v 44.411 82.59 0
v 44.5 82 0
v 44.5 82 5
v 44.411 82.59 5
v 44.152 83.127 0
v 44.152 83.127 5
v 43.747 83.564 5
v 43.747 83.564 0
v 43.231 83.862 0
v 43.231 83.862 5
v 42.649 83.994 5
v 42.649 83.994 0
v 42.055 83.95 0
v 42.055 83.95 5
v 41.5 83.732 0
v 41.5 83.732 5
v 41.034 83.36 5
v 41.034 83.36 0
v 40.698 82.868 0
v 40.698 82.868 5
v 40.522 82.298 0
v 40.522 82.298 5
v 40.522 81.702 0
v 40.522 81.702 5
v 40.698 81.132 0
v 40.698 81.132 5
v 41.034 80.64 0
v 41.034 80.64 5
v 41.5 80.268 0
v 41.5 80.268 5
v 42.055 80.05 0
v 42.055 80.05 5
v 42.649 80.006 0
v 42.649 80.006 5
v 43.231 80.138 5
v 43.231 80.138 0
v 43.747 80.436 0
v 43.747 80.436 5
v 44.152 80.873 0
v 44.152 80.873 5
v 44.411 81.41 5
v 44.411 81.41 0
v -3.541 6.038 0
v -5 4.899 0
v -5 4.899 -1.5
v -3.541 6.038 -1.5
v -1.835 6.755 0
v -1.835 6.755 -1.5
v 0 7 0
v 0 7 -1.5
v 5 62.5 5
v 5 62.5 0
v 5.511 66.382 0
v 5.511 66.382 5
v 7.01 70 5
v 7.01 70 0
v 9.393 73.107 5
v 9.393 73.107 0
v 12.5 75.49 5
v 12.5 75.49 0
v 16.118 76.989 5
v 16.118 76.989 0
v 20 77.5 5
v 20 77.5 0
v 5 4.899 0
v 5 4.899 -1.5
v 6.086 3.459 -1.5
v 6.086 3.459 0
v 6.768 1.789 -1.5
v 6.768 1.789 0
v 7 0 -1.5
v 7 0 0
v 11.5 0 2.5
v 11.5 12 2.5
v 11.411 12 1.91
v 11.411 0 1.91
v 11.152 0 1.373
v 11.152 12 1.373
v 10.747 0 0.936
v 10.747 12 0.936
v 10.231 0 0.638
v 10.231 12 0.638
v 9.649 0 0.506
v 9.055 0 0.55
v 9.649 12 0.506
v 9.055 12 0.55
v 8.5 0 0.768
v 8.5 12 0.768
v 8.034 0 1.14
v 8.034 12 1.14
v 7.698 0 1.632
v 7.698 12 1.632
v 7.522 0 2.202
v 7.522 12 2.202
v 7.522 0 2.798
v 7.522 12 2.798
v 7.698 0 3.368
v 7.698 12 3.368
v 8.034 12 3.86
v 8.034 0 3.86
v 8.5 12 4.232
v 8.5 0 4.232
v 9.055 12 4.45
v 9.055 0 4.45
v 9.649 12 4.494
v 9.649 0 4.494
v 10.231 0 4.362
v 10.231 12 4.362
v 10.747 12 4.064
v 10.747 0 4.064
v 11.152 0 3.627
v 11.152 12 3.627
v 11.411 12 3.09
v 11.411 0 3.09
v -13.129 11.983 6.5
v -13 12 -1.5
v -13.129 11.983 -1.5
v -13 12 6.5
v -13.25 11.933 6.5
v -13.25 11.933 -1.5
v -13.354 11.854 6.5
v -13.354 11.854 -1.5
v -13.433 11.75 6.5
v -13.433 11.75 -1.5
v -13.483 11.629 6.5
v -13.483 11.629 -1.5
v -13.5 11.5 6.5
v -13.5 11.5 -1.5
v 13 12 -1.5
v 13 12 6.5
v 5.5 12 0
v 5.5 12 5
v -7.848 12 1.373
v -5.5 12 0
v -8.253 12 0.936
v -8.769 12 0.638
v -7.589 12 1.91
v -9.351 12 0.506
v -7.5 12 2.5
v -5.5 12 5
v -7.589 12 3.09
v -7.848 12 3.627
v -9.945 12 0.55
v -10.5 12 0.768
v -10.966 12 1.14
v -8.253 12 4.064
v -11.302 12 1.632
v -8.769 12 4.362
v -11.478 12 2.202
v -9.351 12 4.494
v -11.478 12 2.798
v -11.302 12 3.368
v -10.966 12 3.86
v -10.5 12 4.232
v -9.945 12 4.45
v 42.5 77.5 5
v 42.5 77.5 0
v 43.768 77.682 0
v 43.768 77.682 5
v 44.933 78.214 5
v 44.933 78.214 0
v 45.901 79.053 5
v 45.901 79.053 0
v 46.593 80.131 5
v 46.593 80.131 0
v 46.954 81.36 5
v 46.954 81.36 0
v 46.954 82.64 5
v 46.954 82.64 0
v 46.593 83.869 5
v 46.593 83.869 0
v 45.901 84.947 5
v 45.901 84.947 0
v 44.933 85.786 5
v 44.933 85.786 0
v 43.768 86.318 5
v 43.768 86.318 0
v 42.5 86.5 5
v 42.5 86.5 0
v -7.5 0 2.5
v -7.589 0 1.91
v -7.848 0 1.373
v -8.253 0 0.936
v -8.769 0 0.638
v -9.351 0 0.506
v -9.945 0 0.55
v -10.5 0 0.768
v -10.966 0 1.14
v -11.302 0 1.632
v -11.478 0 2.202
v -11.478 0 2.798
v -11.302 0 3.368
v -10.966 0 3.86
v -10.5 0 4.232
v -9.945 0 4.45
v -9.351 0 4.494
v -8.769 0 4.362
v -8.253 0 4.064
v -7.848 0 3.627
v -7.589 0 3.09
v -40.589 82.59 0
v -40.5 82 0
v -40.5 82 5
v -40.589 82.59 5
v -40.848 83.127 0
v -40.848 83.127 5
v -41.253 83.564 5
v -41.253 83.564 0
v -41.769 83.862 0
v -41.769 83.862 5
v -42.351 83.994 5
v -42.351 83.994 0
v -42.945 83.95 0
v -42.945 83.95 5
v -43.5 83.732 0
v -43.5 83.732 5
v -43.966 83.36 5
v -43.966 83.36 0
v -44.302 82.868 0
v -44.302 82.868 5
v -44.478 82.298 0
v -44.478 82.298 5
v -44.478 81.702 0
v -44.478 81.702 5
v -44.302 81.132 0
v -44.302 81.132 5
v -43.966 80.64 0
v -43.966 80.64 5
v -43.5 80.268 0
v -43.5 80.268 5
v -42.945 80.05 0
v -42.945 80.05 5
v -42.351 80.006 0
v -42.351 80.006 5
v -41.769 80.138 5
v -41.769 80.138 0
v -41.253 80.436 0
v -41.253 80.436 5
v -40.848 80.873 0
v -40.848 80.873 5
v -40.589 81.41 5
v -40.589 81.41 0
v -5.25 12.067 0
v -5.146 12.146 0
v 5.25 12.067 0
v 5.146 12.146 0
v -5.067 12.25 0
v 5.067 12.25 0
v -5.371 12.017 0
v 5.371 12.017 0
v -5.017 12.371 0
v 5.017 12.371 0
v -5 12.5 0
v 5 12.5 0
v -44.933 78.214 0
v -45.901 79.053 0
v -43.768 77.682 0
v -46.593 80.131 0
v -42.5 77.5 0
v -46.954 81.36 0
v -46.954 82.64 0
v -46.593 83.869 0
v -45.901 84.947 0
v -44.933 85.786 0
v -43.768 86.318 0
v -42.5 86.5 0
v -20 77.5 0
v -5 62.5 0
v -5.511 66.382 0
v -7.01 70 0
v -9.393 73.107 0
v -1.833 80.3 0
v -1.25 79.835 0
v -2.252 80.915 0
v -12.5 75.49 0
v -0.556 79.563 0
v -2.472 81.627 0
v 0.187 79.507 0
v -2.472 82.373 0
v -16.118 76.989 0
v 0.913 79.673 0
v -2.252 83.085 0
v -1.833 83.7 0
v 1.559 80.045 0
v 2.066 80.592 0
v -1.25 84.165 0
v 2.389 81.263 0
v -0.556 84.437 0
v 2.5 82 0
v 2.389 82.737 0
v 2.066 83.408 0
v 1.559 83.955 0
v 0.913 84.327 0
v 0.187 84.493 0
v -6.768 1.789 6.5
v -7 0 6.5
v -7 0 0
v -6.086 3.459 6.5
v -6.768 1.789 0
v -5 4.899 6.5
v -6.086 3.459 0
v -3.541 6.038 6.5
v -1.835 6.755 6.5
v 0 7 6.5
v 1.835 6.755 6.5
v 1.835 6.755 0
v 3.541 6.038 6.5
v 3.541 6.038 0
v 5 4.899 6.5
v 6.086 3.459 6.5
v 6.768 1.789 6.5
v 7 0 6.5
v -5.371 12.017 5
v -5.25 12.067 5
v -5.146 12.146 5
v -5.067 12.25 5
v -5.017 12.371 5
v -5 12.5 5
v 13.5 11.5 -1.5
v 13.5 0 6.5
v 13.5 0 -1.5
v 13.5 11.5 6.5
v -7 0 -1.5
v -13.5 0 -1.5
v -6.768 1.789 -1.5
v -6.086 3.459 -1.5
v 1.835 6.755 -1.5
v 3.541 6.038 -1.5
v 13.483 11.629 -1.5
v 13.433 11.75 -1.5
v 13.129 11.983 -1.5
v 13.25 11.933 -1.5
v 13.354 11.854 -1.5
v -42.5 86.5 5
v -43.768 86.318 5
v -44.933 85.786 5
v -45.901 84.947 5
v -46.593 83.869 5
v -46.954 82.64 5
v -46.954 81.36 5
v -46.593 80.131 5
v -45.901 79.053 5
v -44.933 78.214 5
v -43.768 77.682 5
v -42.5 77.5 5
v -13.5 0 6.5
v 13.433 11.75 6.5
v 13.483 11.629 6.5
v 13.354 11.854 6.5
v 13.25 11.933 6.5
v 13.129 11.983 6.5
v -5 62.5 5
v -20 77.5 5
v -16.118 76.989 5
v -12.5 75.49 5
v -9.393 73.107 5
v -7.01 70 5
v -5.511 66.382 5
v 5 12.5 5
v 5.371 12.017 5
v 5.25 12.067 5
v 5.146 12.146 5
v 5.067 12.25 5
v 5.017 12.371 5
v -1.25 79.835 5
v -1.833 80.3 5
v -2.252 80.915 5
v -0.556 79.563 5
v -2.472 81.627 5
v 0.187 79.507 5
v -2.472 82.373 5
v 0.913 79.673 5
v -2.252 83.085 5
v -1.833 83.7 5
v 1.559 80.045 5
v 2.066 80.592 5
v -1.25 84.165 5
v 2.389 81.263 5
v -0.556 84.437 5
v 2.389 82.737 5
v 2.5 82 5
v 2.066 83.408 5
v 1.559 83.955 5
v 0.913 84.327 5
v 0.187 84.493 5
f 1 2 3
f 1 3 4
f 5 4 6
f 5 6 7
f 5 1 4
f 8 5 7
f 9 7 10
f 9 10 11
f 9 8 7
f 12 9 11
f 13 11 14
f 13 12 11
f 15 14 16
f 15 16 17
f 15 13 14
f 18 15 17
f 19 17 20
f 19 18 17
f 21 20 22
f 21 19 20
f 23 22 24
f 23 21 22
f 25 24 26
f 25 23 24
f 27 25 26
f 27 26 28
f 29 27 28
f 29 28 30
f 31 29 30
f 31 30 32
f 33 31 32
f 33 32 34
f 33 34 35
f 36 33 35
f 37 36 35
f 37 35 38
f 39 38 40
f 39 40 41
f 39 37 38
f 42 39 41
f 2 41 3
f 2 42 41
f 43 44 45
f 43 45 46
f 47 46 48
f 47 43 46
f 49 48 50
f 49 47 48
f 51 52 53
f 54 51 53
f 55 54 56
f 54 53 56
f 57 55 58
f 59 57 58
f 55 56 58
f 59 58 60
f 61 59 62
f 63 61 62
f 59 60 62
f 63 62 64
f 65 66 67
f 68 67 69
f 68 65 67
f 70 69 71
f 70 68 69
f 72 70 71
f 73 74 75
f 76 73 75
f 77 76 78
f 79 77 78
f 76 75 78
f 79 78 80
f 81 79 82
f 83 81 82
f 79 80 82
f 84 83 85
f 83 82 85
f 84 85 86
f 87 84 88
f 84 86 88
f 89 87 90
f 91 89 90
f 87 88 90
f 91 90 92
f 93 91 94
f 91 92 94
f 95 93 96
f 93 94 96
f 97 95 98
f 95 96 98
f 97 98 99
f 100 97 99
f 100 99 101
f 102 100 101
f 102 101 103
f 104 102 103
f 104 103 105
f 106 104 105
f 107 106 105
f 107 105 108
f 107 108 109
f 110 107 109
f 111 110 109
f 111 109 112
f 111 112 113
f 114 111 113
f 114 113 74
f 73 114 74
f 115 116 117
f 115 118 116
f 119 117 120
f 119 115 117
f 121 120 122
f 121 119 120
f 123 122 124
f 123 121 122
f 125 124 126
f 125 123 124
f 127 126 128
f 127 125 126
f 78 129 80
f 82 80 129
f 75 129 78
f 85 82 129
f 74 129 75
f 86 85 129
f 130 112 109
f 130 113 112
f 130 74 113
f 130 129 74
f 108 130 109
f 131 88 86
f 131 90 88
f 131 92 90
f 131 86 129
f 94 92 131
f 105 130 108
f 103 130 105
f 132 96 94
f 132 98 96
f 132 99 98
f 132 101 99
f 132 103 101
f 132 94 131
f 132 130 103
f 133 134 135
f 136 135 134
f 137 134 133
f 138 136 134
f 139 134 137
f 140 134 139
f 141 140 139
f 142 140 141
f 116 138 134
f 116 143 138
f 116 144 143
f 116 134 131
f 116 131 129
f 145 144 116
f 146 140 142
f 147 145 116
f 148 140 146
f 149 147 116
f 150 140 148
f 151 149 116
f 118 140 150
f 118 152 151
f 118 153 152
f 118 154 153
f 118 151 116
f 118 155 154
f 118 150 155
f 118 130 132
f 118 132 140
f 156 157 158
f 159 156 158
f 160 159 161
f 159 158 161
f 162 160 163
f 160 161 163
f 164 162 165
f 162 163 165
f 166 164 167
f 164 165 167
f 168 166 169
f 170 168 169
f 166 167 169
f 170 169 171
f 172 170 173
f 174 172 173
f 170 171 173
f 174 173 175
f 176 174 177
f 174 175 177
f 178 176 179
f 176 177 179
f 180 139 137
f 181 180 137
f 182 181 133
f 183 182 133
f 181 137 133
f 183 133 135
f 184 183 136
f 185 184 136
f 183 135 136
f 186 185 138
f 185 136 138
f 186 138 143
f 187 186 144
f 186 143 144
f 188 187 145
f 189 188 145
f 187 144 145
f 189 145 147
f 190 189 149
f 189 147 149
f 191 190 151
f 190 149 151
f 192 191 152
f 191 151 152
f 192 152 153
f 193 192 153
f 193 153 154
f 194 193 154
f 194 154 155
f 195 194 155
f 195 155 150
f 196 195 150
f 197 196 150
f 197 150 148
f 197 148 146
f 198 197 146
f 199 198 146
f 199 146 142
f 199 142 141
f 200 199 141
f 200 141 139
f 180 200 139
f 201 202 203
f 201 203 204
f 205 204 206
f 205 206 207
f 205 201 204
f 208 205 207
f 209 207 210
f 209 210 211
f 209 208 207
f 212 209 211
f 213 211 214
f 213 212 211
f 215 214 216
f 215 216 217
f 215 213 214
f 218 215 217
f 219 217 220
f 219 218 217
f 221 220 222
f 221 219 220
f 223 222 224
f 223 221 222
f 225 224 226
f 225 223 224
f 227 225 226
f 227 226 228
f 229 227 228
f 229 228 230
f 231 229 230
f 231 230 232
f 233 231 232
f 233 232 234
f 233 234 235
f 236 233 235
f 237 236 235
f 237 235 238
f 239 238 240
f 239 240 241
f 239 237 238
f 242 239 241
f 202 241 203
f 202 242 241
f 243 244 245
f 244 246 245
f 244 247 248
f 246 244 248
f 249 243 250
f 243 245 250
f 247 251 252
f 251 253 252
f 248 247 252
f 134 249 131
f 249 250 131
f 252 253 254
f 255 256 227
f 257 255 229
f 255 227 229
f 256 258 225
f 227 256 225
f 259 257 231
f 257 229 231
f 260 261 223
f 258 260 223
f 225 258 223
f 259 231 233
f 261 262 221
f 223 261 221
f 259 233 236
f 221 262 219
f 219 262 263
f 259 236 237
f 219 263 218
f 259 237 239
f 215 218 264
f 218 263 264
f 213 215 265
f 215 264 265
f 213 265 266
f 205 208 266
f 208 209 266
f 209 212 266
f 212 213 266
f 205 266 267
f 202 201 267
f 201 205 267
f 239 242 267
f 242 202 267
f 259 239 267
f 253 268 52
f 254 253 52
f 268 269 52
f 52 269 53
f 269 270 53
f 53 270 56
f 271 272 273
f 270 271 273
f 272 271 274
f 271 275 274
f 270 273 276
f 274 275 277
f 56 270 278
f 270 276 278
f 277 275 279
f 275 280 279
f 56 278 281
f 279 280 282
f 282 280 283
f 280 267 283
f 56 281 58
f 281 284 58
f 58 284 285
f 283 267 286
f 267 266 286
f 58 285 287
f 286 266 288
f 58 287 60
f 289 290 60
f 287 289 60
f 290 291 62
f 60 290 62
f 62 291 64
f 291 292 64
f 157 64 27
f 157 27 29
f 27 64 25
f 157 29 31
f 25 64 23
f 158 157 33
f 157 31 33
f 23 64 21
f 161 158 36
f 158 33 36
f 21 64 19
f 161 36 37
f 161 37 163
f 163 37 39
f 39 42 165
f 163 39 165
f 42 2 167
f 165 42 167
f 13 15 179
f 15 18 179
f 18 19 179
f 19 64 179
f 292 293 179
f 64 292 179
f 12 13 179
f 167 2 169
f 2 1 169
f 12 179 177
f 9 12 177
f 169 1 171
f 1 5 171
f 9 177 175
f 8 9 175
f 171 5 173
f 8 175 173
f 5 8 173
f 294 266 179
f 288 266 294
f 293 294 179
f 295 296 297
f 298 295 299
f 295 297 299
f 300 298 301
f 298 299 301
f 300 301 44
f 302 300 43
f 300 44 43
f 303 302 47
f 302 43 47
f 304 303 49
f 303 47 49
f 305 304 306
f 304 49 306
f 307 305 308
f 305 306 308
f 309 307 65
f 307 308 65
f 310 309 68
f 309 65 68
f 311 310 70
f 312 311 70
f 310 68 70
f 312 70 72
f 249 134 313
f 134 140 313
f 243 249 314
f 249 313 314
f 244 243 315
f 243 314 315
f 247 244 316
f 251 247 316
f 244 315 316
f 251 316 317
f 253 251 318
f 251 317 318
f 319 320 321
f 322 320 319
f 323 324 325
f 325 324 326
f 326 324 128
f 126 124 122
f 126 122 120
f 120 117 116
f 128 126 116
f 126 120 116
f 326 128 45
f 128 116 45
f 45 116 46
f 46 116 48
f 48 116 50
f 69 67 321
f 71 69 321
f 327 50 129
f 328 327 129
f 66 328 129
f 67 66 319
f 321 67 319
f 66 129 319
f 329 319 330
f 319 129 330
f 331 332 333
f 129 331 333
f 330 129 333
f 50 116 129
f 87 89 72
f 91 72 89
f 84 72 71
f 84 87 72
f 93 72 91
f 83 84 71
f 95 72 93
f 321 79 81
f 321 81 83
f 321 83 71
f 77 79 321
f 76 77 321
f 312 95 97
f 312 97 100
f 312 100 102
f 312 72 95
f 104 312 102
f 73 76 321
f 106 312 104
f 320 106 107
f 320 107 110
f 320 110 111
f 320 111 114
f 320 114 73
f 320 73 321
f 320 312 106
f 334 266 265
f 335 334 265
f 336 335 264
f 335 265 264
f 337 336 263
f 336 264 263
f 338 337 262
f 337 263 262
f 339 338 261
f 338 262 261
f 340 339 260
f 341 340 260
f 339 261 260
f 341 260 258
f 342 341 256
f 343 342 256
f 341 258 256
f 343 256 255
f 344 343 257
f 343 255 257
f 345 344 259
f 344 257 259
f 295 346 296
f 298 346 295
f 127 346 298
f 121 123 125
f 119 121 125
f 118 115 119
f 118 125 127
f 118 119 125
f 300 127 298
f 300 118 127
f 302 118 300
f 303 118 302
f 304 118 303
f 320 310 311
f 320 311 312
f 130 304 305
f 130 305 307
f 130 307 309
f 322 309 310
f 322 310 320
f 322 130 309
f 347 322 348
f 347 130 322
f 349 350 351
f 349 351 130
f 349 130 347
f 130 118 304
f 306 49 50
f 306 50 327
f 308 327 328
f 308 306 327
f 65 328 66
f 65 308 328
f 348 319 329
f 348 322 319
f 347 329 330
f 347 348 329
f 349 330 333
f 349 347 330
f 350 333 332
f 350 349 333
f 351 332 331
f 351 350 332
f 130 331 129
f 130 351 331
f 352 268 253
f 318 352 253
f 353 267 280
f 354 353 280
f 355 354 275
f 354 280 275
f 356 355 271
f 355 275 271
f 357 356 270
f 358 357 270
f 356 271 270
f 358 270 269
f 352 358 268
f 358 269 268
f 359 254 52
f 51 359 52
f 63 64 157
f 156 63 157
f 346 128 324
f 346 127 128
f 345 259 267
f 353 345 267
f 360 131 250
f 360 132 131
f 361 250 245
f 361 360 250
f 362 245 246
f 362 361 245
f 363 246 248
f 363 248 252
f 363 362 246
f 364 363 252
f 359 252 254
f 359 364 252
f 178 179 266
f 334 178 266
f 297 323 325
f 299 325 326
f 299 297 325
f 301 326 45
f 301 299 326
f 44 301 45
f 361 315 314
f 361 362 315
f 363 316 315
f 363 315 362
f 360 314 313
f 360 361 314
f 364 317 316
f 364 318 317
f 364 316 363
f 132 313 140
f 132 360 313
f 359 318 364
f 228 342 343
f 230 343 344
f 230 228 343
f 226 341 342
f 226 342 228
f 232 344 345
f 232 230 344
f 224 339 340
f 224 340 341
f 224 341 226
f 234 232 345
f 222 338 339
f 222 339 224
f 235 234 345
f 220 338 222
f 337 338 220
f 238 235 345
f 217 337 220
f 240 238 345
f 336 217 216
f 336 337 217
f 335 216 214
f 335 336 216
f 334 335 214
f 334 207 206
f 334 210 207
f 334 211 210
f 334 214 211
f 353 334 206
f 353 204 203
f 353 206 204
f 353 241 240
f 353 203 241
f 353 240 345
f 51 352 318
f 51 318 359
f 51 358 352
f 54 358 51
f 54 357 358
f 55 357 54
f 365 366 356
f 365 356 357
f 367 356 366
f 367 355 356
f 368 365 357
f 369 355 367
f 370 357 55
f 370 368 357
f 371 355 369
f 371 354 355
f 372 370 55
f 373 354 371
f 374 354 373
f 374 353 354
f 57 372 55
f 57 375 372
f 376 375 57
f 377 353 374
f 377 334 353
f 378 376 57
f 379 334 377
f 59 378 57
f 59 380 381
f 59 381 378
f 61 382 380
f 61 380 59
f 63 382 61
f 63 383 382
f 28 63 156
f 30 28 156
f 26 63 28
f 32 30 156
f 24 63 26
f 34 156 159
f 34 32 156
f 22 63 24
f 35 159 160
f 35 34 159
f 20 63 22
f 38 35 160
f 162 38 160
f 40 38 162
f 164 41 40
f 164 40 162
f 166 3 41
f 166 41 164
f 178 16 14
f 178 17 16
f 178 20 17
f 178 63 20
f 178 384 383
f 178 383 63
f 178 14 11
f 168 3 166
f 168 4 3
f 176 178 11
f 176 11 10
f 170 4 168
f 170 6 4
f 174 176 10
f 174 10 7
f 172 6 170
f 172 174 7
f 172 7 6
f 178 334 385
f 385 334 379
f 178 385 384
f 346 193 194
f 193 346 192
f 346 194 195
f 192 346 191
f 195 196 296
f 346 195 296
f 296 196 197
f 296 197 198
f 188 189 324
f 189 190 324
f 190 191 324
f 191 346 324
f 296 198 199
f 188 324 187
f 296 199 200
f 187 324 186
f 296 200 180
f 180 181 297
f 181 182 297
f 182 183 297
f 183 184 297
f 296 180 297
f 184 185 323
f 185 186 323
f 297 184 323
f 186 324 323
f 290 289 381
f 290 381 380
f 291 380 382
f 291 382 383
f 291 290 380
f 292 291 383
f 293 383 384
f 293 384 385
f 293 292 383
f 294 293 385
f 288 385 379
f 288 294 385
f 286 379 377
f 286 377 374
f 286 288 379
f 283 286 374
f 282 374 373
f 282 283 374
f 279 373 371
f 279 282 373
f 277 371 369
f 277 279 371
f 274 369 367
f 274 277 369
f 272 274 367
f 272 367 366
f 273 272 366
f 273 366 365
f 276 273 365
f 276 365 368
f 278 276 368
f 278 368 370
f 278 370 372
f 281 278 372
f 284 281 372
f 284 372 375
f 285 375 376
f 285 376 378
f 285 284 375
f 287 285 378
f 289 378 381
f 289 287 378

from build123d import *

# Parameters (mm, degrees)
SKETCH1_R                = 2.5
SKETCH1_R_2              = 2
BOSS_EXTRUDE1_DEPTH      = 5
BOSS_EXTRUDE2_DEPTH      = 6.5
BOSS_EXTRUDE2_DEPTH_BACK = 1.5
SKETCH2_R                = 2
CUT_EXTRUDE1_DEPTH       = 100
FILLET1_R                = 0.5


with BuildPart() as part:
    # Sketch1 → Boss-Extrude1 (new body)
    with BuildSketch(Plane.XY):
        with BuildLine():
            Line((7, 0), (13.5, 0))
            Line((13.5, 0), (13.5, 12))
            Line((13.5, 12), (5, 12))
            Line((5, 12), (5, 62.5))
            ThreePointArc((5, 62.5), (9.393398312, 73.106601748), (20.000000086, 77.5))
            Line((20.000000086, 77.5), (42.5, 77.5))
            ThreePointArc((42.5, 77.5), (47, 82), (42.5, 86.5))
            Line((42.5, 86.5), (-42.5, 86.5))
            ThreePointArc((-42.5, 86.5), (-47, 82), (-42.5, 77.5))
            Line((-42.5, 77.5), (-20, 77.5))
            ThreePointArc((-20, 77.5), (-9.393398282, 73.106601718), (-5, 62.5))
            Line((-5, 62.5), (-5, 12))
            Line((-5, 12), (-13.5, 12))
            Line((-13.5, 12), (-13.5, 0))
            Line((-13.5, 0), (-7, 0))
            ThreePointArc((-7, 0), (0, 7), (7, 0))
        make_face()
        with Locations((0, 82)):
            Circle(SKETCH1_R, mode=Mode.SUBTRACT)
        with Locations((42.5, 82)):
            Circle(SKETCH1_R_2, mode=Mode.SUBTRACT)
        with Locations((-42.5, 82)):
            Circle(SKETCH1_R_2, mode=Mode.SUBTRACT)
    extrude(amount=BOSS_EXTRUDE1_DEPTH)

    # Sketch1<3> → Boss-Extrude2 (add, two sides: drawn at the far end of the back side and taken through both)
    with BuildSketch(Plane.XY.offset(-BOSS_EXTRUDE2_DEPTH_BACK)):
        with BuildLine():
            Line((7, 0), (13.5, 0))
            Line((13.5, 0), (13.5, 12))
            Line((13.5, 12), (-13.5, 12))
            Line((-13.5, 12), (-13.5, 0))
            Line((-13.5, 0), (-7, 0))
            ThreePointArc((-7, 0), (0, 7), (7, 0))
        make_face()
    extrude(amount=BOSS_EXTRUDE2_DEPTH + BOSS_EXTRUDE2_DEPTH_BACK)

    # Sketch2 → Cut-Extrude1 (cut)
    with BuildSketch(Plane(origin=(0, 12, 0), x_dir=(1, 0, 0), z_dir=(0, 1, 0))):
        with Locations((9.5, -2.5)):
            Circle(SKETCH2_R)
        with Locations((-9.5, -2.5)):
            Circle(SKETCH2_R)
    extrude(amount=-CUT_EXTRUDE1_DEPTH, mode=Mode.SUBTRACT)

    # Fillet1
    fillet1_edges = [part.edges().sort_by_distance(p)[0] for p in [
        (-13.5, 12, 2.5),
        (-5, 12, 2.5),
        (13.5, 12, 2.5),
        (5, 12, 2.5),
    ]]
    fillet(fillet1_edges, radius=FILLET1_R)


solid = part.part
